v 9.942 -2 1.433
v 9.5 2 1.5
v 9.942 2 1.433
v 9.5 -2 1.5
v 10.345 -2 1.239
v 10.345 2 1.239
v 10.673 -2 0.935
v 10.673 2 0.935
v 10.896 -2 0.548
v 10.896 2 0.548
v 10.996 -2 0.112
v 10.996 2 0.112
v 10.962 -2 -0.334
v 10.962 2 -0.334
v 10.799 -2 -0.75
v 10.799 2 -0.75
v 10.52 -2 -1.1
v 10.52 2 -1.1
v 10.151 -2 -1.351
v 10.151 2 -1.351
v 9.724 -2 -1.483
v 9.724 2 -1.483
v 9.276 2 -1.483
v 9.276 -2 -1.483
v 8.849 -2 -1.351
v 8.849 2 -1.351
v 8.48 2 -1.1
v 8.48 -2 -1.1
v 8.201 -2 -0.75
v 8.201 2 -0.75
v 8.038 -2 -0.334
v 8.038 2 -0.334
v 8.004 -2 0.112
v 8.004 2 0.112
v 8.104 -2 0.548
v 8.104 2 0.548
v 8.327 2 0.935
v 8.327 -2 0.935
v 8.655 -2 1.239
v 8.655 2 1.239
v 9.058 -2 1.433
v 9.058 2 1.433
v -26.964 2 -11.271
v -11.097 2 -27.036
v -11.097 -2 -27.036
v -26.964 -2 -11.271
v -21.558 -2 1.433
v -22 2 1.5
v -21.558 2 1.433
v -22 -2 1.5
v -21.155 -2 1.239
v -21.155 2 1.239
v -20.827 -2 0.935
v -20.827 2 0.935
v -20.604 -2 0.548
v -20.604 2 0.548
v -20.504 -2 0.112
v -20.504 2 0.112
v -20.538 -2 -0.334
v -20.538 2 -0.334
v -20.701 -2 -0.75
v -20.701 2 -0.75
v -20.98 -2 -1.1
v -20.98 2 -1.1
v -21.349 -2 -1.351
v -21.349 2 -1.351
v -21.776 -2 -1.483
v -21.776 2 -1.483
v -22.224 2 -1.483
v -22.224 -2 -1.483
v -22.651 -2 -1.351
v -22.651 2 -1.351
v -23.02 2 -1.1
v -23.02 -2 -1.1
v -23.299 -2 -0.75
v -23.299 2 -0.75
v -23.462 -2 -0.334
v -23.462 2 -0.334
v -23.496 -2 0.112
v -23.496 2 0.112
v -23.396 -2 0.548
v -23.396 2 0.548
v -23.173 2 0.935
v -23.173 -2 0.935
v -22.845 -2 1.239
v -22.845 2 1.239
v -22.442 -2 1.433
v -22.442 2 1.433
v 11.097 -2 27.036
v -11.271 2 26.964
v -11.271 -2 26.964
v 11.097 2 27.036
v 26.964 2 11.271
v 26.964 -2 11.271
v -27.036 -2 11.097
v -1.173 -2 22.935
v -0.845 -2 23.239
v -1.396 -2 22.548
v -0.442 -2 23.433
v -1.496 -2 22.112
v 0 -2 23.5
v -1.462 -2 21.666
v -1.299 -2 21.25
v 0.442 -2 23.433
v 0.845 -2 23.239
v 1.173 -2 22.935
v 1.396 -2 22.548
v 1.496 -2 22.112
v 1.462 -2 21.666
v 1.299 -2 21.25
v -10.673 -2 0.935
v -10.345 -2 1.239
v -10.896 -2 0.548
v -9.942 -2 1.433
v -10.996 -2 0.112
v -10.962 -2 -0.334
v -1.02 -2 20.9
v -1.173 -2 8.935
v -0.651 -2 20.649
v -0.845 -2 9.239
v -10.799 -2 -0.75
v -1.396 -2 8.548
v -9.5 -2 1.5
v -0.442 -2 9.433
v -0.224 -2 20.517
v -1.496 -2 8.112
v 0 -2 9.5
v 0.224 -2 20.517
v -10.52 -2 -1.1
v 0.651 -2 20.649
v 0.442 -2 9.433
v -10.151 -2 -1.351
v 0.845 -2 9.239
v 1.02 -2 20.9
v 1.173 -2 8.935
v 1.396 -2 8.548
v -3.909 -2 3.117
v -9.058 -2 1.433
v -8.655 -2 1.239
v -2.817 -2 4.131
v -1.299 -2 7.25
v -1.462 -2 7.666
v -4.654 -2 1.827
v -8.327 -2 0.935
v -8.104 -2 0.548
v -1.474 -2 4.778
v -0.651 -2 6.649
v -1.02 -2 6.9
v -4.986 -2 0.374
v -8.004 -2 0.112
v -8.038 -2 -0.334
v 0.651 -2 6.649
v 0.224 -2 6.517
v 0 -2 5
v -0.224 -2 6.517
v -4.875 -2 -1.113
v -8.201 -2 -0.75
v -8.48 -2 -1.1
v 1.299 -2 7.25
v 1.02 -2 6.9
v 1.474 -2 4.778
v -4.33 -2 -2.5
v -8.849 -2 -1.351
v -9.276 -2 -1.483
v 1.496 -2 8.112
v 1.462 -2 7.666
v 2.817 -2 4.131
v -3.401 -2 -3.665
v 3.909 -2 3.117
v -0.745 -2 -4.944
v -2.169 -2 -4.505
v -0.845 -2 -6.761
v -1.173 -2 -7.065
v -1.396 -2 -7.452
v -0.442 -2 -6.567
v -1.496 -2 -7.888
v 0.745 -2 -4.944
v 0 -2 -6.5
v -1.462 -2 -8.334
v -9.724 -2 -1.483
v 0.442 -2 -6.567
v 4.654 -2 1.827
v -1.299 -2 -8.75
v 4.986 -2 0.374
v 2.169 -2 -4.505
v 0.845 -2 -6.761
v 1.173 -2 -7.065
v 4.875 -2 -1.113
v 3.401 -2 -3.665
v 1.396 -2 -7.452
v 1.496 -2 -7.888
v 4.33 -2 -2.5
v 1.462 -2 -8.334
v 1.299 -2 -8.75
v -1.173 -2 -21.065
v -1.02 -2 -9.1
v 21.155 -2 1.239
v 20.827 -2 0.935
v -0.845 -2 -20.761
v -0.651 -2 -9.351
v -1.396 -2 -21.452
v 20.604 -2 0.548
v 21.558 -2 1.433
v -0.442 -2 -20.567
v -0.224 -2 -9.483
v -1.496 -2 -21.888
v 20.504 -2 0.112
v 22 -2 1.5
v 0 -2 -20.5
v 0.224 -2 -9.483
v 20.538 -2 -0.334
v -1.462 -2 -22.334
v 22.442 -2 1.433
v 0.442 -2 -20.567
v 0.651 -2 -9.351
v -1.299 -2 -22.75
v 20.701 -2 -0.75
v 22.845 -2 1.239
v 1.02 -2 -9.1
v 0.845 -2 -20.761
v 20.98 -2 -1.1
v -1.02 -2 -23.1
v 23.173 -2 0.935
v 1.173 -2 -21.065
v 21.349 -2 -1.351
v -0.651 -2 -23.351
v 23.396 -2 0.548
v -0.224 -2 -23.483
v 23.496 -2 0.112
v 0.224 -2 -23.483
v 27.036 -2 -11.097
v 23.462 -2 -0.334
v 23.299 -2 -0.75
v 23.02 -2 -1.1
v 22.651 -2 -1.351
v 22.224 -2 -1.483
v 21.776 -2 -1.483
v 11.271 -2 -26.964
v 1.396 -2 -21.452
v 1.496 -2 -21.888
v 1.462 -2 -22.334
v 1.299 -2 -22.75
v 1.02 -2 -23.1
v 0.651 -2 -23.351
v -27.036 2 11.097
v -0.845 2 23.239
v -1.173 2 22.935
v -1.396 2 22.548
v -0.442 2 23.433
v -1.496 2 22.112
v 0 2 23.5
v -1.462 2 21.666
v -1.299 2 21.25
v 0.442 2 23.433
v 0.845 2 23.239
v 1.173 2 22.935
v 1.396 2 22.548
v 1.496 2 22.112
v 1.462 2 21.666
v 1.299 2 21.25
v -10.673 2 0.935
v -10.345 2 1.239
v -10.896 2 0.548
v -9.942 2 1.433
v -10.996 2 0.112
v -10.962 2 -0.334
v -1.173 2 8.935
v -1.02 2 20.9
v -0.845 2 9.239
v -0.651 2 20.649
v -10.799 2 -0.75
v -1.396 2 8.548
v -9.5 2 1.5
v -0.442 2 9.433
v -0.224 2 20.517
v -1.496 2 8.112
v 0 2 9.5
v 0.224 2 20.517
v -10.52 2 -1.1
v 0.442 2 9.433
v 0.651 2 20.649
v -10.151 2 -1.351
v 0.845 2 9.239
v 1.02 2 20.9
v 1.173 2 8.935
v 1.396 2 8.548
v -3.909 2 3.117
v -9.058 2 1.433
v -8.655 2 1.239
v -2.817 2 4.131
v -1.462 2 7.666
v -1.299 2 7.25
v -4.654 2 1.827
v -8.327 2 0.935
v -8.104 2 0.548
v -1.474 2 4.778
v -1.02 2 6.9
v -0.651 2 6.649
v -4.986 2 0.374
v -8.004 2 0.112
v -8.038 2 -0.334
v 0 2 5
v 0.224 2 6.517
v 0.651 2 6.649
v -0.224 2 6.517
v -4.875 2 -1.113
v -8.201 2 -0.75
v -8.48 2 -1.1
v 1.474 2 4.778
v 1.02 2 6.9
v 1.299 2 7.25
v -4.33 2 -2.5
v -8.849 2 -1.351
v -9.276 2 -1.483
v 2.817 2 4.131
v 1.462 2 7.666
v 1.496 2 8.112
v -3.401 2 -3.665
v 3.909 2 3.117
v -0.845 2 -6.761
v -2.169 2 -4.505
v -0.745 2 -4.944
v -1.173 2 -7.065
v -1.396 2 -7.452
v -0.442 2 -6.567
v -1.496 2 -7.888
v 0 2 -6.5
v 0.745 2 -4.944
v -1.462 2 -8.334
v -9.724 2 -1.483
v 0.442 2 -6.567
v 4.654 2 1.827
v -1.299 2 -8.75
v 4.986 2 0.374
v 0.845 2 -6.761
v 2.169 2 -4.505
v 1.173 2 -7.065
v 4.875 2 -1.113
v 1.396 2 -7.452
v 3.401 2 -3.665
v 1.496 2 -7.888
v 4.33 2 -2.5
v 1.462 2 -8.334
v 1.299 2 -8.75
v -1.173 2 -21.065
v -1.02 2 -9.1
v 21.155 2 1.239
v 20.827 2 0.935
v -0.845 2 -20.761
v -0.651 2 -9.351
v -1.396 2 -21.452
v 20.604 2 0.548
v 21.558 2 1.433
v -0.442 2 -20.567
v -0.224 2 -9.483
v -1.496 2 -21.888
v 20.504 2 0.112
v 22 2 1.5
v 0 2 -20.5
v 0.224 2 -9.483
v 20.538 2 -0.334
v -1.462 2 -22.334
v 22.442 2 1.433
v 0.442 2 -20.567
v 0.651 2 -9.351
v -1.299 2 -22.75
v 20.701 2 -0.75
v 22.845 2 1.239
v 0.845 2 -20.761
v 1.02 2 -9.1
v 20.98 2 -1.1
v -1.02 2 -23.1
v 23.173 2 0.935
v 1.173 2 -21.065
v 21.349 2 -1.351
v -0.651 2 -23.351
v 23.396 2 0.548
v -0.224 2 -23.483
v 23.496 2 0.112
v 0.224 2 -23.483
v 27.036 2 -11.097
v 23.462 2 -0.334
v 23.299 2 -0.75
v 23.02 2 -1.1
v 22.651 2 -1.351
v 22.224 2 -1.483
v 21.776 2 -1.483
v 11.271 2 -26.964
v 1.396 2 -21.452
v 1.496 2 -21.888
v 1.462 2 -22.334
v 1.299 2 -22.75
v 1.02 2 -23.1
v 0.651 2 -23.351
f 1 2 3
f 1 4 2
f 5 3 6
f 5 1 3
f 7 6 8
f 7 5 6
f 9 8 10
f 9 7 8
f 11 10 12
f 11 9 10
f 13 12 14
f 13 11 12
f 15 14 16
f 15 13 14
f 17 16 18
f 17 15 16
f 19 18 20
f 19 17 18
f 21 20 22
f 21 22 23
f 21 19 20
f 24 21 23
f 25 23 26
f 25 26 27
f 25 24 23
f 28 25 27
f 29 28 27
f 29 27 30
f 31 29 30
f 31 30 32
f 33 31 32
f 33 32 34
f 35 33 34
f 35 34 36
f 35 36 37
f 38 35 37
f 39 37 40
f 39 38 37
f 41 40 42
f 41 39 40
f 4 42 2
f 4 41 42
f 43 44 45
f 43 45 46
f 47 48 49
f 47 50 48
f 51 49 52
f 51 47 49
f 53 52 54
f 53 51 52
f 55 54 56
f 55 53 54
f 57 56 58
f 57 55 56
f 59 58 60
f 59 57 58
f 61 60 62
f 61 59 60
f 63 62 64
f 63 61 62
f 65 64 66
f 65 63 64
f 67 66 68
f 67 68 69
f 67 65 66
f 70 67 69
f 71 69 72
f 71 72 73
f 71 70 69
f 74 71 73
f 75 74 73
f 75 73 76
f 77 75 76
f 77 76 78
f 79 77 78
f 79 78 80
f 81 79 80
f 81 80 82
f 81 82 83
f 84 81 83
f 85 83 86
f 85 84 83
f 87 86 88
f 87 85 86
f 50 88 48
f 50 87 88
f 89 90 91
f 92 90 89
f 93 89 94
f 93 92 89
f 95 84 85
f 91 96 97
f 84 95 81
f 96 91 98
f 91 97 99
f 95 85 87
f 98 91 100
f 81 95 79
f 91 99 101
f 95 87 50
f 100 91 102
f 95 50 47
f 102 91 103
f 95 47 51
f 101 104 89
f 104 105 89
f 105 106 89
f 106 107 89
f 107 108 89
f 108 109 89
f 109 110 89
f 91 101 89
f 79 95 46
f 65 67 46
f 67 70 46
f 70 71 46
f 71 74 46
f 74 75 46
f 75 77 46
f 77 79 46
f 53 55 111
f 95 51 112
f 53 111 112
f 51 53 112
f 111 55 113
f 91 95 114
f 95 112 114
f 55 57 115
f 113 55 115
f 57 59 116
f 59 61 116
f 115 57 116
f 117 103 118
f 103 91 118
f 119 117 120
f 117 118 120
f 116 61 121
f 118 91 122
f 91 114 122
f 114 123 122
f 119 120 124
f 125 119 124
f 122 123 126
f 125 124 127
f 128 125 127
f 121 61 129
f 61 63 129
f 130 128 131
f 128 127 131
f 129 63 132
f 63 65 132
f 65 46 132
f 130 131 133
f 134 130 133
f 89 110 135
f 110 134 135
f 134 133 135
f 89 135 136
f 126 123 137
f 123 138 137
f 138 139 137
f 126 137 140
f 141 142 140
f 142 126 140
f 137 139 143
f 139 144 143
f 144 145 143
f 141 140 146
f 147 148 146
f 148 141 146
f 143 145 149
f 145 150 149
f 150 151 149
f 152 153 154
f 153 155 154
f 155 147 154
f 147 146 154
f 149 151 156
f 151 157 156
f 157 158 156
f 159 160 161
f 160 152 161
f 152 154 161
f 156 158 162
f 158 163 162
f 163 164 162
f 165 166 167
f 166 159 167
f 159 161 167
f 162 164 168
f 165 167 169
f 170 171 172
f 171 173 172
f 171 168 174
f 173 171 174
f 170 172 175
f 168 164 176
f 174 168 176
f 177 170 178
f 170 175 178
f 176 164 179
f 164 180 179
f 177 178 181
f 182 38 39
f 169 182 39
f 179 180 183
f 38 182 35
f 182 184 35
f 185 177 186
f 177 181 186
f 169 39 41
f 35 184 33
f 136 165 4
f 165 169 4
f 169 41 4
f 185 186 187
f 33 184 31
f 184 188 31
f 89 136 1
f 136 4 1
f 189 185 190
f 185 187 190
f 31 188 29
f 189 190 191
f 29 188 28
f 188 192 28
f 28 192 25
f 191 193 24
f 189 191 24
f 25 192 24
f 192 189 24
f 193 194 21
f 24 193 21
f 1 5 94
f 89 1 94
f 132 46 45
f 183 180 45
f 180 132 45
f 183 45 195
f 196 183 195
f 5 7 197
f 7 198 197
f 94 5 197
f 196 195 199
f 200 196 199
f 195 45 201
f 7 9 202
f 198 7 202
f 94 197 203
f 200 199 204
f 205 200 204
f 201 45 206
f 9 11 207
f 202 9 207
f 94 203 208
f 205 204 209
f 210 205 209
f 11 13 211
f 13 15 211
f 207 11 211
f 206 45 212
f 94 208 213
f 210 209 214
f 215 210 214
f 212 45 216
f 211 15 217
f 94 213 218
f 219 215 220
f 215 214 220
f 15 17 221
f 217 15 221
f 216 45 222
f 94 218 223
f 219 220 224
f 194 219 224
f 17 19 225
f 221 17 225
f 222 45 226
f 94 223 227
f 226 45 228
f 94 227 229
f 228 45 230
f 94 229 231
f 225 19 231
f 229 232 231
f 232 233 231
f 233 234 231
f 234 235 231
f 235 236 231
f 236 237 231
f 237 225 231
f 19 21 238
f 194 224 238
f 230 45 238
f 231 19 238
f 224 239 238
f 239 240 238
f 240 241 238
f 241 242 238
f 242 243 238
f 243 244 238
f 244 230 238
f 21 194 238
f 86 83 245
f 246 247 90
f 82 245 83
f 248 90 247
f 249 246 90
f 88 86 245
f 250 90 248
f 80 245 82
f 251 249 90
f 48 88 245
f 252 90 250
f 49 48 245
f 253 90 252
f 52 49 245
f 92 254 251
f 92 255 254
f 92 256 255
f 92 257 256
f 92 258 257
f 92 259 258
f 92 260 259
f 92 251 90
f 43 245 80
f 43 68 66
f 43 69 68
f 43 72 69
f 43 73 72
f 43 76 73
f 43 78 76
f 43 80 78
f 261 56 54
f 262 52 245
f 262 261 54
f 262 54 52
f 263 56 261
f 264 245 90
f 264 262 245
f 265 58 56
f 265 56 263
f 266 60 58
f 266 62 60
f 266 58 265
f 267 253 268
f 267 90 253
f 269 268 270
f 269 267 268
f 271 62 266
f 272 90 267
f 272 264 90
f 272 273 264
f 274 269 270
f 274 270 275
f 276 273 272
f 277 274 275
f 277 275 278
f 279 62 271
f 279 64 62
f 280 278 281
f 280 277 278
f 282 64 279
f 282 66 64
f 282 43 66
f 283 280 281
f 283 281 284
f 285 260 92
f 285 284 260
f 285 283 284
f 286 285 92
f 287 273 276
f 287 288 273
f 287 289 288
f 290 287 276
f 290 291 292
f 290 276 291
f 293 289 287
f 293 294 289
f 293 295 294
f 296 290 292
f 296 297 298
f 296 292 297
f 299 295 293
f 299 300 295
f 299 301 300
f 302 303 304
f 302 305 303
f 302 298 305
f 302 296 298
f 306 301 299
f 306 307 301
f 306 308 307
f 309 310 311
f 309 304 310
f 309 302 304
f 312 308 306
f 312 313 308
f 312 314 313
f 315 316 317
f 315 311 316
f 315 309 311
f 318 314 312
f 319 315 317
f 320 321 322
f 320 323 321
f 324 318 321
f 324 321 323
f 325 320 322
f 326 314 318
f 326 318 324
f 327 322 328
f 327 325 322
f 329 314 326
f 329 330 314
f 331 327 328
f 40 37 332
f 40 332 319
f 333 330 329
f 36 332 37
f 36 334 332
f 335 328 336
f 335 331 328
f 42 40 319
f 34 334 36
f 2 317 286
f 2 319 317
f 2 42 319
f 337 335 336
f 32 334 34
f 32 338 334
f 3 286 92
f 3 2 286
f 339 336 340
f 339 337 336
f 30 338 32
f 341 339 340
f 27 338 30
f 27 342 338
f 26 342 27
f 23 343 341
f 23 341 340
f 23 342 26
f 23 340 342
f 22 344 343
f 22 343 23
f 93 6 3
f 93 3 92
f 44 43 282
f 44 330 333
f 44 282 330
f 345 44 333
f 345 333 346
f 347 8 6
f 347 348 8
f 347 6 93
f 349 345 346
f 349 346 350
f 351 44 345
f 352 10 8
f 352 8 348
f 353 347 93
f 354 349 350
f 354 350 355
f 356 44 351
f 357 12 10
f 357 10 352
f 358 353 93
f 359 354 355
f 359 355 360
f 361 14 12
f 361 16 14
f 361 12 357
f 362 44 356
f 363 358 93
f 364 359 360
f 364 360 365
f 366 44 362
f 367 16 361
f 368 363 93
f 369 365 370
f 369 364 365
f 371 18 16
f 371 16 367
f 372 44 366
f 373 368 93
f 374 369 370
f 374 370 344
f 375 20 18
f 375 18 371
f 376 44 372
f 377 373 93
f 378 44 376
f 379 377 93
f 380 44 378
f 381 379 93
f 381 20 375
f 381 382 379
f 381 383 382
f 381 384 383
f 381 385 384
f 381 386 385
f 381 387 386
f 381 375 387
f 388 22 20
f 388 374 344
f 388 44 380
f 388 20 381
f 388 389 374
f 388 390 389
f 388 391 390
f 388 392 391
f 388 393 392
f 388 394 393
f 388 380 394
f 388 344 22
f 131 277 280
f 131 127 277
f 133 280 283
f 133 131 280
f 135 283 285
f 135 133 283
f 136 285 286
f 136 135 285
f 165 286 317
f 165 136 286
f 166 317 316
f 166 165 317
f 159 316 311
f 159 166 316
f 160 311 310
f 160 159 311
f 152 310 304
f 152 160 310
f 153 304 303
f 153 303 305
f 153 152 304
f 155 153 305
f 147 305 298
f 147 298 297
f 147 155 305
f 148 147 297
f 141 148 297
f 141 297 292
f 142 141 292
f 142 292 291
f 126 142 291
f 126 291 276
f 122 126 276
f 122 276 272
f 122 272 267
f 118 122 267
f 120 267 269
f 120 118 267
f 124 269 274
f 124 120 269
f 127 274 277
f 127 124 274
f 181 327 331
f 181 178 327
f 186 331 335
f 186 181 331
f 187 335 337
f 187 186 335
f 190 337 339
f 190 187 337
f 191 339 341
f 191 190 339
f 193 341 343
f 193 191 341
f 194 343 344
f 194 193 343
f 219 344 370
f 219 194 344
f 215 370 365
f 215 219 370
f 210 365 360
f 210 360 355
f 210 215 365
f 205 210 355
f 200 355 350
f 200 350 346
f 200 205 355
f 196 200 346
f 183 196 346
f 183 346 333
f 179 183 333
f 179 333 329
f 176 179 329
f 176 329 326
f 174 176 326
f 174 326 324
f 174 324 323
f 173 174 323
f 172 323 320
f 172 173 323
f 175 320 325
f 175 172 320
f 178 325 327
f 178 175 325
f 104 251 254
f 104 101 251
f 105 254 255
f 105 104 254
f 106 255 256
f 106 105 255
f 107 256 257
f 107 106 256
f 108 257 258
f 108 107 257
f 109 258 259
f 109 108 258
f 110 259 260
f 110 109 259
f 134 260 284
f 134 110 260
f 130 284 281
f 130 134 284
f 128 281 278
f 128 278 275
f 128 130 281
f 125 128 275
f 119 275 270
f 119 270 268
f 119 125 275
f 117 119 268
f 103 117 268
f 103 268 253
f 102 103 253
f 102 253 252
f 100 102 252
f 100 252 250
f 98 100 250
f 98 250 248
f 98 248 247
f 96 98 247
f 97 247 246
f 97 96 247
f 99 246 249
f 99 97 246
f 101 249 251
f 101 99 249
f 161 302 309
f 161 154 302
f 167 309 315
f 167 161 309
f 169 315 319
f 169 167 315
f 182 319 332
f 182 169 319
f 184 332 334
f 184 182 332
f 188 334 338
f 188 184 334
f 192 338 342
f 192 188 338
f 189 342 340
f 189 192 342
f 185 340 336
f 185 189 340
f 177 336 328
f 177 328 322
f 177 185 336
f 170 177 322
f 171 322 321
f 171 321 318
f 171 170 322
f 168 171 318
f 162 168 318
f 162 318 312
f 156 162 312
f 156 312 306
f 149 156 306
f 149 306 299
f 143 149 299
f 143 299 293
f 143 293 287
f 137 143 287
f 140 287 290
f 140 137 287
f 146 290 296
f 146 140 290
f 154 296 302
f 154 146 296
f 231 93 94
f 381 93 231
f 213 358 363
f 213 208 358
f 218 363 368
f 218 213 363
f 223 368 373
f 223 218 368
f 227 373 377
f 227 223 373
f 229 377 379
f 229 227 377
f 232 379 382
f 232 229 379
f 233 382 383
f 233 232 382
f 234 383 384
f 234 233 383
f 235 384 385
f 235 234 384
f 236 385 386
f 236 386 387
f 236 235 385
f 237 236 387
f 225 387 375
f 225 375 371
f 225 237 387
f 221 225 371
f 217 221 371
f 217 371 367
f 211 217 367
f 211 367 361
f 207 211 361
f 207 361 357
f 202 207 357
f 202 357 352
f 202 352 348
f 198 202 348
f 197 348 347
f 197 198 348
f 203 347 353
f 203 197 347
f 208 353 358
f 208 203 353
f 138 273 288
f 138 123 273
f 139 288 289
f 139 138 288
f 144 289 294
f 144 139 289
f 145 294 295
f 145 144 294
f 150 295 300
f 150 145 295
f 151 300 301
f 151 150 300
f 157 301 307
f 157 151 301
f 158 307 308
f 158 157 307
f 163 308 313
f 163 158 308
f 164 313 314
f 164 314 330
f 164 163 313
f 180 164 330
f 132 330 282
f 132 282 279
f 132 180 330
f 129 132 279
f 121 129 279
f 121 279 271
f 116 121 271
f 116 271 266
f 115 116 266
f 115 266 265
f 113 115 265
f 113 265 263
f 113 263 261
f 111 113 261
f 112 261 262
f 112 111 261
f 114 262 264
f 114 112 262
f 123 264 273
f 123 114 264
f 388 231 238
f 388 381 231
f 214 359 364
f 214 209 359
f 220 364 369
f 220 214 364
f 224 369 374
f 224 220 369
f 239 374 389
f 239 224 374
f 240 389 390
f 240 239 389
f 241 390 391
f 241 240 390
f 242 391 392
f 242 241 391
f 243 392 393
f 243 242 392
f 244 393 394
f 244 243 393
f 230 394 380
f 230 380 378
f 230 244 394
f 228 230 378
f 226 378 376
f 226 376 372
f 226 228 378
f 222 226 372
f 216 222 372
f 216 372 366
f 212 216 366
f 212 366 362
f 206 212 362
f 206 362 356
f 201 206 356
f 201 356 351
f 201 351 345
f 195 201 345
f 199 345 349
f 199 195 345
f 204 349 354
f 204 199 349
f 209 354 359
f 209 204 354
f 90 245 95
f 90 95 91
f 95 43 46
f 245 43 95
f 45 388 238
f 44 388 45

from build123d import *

# Parameters (mm, degrees)
SKETCH1_R           = 1.5
SKETCH1_R_2         = 5
BOSS_EXTRUDE1_DEPTH = 2


with BuildPart() as part:
    # Sketch1 → Boss-Extrude1 (new, symmetric)
    with BuildSketch(Plane(origin=(0, 0, 0), x_dir=(1, 0, 0), z_dir=(0, 1, 0))):
        Polygon((11.27052257, 26.963900813), (-11.096894175, 27.035820049), (-26.963900813, 11.27052257), (-27.035820049, -11.096894175), (-11.27052257, -26.963900813), (11.096894175, -27.035820049), (26.963900813, -11.27052257), (27.035820049, 11.096894175), align=None)
        with Locations(Location((0, 22, 0), (0, 0, 270))):
            Circle(SKETCH1_R, mode=Mode.SUBTRACT)
        with Locations(Location((22, 0, 0), (0, 0, 270))):
            Circle(SKETCH1_R, mode=Mode.SUBTRACT)
        with Locations(Location((0, -22, 0), (0, 0, 270))):
            Circle(SKETCH1_R, mode=Mode.SUBTRACT)
        with Locations(Location((-22, 0, 0), (0, 0, 270))):
            Circle(SKETCH1_R, mode=Mode.SUBTRACT)
        with Locations(Location((0, 0, 0), (0, 0, 270))):
            Circle(SKETCH1_R_2, mode=Mode.SUBTRACT)
        with Locations(Location((-9.5, 0, 0), (0, 0, 270))):
            Circle(SKETCH1_R, mode=Mode.SUBTRACT)
        with Locations(Location((0, -8, 0), (0, 0, 270))):
            Circle(SKETCH1_R, mode=Mode.SUBTRACT)
        with Locations(Location((9.5, 0, 0), (0, 0, 270))):
            Circle(SKETCH1_R, mode=Mode.SUBTRACT)
        with Locations(Location((0, 8, 0), (0, 0, 270))):
            Circle(SKETCH1_R, mode=Mode.SUBTRACT)
    extrude(amount=BOSS_EXTRUDE1_DEPTH, both=True)


solid = part.part
